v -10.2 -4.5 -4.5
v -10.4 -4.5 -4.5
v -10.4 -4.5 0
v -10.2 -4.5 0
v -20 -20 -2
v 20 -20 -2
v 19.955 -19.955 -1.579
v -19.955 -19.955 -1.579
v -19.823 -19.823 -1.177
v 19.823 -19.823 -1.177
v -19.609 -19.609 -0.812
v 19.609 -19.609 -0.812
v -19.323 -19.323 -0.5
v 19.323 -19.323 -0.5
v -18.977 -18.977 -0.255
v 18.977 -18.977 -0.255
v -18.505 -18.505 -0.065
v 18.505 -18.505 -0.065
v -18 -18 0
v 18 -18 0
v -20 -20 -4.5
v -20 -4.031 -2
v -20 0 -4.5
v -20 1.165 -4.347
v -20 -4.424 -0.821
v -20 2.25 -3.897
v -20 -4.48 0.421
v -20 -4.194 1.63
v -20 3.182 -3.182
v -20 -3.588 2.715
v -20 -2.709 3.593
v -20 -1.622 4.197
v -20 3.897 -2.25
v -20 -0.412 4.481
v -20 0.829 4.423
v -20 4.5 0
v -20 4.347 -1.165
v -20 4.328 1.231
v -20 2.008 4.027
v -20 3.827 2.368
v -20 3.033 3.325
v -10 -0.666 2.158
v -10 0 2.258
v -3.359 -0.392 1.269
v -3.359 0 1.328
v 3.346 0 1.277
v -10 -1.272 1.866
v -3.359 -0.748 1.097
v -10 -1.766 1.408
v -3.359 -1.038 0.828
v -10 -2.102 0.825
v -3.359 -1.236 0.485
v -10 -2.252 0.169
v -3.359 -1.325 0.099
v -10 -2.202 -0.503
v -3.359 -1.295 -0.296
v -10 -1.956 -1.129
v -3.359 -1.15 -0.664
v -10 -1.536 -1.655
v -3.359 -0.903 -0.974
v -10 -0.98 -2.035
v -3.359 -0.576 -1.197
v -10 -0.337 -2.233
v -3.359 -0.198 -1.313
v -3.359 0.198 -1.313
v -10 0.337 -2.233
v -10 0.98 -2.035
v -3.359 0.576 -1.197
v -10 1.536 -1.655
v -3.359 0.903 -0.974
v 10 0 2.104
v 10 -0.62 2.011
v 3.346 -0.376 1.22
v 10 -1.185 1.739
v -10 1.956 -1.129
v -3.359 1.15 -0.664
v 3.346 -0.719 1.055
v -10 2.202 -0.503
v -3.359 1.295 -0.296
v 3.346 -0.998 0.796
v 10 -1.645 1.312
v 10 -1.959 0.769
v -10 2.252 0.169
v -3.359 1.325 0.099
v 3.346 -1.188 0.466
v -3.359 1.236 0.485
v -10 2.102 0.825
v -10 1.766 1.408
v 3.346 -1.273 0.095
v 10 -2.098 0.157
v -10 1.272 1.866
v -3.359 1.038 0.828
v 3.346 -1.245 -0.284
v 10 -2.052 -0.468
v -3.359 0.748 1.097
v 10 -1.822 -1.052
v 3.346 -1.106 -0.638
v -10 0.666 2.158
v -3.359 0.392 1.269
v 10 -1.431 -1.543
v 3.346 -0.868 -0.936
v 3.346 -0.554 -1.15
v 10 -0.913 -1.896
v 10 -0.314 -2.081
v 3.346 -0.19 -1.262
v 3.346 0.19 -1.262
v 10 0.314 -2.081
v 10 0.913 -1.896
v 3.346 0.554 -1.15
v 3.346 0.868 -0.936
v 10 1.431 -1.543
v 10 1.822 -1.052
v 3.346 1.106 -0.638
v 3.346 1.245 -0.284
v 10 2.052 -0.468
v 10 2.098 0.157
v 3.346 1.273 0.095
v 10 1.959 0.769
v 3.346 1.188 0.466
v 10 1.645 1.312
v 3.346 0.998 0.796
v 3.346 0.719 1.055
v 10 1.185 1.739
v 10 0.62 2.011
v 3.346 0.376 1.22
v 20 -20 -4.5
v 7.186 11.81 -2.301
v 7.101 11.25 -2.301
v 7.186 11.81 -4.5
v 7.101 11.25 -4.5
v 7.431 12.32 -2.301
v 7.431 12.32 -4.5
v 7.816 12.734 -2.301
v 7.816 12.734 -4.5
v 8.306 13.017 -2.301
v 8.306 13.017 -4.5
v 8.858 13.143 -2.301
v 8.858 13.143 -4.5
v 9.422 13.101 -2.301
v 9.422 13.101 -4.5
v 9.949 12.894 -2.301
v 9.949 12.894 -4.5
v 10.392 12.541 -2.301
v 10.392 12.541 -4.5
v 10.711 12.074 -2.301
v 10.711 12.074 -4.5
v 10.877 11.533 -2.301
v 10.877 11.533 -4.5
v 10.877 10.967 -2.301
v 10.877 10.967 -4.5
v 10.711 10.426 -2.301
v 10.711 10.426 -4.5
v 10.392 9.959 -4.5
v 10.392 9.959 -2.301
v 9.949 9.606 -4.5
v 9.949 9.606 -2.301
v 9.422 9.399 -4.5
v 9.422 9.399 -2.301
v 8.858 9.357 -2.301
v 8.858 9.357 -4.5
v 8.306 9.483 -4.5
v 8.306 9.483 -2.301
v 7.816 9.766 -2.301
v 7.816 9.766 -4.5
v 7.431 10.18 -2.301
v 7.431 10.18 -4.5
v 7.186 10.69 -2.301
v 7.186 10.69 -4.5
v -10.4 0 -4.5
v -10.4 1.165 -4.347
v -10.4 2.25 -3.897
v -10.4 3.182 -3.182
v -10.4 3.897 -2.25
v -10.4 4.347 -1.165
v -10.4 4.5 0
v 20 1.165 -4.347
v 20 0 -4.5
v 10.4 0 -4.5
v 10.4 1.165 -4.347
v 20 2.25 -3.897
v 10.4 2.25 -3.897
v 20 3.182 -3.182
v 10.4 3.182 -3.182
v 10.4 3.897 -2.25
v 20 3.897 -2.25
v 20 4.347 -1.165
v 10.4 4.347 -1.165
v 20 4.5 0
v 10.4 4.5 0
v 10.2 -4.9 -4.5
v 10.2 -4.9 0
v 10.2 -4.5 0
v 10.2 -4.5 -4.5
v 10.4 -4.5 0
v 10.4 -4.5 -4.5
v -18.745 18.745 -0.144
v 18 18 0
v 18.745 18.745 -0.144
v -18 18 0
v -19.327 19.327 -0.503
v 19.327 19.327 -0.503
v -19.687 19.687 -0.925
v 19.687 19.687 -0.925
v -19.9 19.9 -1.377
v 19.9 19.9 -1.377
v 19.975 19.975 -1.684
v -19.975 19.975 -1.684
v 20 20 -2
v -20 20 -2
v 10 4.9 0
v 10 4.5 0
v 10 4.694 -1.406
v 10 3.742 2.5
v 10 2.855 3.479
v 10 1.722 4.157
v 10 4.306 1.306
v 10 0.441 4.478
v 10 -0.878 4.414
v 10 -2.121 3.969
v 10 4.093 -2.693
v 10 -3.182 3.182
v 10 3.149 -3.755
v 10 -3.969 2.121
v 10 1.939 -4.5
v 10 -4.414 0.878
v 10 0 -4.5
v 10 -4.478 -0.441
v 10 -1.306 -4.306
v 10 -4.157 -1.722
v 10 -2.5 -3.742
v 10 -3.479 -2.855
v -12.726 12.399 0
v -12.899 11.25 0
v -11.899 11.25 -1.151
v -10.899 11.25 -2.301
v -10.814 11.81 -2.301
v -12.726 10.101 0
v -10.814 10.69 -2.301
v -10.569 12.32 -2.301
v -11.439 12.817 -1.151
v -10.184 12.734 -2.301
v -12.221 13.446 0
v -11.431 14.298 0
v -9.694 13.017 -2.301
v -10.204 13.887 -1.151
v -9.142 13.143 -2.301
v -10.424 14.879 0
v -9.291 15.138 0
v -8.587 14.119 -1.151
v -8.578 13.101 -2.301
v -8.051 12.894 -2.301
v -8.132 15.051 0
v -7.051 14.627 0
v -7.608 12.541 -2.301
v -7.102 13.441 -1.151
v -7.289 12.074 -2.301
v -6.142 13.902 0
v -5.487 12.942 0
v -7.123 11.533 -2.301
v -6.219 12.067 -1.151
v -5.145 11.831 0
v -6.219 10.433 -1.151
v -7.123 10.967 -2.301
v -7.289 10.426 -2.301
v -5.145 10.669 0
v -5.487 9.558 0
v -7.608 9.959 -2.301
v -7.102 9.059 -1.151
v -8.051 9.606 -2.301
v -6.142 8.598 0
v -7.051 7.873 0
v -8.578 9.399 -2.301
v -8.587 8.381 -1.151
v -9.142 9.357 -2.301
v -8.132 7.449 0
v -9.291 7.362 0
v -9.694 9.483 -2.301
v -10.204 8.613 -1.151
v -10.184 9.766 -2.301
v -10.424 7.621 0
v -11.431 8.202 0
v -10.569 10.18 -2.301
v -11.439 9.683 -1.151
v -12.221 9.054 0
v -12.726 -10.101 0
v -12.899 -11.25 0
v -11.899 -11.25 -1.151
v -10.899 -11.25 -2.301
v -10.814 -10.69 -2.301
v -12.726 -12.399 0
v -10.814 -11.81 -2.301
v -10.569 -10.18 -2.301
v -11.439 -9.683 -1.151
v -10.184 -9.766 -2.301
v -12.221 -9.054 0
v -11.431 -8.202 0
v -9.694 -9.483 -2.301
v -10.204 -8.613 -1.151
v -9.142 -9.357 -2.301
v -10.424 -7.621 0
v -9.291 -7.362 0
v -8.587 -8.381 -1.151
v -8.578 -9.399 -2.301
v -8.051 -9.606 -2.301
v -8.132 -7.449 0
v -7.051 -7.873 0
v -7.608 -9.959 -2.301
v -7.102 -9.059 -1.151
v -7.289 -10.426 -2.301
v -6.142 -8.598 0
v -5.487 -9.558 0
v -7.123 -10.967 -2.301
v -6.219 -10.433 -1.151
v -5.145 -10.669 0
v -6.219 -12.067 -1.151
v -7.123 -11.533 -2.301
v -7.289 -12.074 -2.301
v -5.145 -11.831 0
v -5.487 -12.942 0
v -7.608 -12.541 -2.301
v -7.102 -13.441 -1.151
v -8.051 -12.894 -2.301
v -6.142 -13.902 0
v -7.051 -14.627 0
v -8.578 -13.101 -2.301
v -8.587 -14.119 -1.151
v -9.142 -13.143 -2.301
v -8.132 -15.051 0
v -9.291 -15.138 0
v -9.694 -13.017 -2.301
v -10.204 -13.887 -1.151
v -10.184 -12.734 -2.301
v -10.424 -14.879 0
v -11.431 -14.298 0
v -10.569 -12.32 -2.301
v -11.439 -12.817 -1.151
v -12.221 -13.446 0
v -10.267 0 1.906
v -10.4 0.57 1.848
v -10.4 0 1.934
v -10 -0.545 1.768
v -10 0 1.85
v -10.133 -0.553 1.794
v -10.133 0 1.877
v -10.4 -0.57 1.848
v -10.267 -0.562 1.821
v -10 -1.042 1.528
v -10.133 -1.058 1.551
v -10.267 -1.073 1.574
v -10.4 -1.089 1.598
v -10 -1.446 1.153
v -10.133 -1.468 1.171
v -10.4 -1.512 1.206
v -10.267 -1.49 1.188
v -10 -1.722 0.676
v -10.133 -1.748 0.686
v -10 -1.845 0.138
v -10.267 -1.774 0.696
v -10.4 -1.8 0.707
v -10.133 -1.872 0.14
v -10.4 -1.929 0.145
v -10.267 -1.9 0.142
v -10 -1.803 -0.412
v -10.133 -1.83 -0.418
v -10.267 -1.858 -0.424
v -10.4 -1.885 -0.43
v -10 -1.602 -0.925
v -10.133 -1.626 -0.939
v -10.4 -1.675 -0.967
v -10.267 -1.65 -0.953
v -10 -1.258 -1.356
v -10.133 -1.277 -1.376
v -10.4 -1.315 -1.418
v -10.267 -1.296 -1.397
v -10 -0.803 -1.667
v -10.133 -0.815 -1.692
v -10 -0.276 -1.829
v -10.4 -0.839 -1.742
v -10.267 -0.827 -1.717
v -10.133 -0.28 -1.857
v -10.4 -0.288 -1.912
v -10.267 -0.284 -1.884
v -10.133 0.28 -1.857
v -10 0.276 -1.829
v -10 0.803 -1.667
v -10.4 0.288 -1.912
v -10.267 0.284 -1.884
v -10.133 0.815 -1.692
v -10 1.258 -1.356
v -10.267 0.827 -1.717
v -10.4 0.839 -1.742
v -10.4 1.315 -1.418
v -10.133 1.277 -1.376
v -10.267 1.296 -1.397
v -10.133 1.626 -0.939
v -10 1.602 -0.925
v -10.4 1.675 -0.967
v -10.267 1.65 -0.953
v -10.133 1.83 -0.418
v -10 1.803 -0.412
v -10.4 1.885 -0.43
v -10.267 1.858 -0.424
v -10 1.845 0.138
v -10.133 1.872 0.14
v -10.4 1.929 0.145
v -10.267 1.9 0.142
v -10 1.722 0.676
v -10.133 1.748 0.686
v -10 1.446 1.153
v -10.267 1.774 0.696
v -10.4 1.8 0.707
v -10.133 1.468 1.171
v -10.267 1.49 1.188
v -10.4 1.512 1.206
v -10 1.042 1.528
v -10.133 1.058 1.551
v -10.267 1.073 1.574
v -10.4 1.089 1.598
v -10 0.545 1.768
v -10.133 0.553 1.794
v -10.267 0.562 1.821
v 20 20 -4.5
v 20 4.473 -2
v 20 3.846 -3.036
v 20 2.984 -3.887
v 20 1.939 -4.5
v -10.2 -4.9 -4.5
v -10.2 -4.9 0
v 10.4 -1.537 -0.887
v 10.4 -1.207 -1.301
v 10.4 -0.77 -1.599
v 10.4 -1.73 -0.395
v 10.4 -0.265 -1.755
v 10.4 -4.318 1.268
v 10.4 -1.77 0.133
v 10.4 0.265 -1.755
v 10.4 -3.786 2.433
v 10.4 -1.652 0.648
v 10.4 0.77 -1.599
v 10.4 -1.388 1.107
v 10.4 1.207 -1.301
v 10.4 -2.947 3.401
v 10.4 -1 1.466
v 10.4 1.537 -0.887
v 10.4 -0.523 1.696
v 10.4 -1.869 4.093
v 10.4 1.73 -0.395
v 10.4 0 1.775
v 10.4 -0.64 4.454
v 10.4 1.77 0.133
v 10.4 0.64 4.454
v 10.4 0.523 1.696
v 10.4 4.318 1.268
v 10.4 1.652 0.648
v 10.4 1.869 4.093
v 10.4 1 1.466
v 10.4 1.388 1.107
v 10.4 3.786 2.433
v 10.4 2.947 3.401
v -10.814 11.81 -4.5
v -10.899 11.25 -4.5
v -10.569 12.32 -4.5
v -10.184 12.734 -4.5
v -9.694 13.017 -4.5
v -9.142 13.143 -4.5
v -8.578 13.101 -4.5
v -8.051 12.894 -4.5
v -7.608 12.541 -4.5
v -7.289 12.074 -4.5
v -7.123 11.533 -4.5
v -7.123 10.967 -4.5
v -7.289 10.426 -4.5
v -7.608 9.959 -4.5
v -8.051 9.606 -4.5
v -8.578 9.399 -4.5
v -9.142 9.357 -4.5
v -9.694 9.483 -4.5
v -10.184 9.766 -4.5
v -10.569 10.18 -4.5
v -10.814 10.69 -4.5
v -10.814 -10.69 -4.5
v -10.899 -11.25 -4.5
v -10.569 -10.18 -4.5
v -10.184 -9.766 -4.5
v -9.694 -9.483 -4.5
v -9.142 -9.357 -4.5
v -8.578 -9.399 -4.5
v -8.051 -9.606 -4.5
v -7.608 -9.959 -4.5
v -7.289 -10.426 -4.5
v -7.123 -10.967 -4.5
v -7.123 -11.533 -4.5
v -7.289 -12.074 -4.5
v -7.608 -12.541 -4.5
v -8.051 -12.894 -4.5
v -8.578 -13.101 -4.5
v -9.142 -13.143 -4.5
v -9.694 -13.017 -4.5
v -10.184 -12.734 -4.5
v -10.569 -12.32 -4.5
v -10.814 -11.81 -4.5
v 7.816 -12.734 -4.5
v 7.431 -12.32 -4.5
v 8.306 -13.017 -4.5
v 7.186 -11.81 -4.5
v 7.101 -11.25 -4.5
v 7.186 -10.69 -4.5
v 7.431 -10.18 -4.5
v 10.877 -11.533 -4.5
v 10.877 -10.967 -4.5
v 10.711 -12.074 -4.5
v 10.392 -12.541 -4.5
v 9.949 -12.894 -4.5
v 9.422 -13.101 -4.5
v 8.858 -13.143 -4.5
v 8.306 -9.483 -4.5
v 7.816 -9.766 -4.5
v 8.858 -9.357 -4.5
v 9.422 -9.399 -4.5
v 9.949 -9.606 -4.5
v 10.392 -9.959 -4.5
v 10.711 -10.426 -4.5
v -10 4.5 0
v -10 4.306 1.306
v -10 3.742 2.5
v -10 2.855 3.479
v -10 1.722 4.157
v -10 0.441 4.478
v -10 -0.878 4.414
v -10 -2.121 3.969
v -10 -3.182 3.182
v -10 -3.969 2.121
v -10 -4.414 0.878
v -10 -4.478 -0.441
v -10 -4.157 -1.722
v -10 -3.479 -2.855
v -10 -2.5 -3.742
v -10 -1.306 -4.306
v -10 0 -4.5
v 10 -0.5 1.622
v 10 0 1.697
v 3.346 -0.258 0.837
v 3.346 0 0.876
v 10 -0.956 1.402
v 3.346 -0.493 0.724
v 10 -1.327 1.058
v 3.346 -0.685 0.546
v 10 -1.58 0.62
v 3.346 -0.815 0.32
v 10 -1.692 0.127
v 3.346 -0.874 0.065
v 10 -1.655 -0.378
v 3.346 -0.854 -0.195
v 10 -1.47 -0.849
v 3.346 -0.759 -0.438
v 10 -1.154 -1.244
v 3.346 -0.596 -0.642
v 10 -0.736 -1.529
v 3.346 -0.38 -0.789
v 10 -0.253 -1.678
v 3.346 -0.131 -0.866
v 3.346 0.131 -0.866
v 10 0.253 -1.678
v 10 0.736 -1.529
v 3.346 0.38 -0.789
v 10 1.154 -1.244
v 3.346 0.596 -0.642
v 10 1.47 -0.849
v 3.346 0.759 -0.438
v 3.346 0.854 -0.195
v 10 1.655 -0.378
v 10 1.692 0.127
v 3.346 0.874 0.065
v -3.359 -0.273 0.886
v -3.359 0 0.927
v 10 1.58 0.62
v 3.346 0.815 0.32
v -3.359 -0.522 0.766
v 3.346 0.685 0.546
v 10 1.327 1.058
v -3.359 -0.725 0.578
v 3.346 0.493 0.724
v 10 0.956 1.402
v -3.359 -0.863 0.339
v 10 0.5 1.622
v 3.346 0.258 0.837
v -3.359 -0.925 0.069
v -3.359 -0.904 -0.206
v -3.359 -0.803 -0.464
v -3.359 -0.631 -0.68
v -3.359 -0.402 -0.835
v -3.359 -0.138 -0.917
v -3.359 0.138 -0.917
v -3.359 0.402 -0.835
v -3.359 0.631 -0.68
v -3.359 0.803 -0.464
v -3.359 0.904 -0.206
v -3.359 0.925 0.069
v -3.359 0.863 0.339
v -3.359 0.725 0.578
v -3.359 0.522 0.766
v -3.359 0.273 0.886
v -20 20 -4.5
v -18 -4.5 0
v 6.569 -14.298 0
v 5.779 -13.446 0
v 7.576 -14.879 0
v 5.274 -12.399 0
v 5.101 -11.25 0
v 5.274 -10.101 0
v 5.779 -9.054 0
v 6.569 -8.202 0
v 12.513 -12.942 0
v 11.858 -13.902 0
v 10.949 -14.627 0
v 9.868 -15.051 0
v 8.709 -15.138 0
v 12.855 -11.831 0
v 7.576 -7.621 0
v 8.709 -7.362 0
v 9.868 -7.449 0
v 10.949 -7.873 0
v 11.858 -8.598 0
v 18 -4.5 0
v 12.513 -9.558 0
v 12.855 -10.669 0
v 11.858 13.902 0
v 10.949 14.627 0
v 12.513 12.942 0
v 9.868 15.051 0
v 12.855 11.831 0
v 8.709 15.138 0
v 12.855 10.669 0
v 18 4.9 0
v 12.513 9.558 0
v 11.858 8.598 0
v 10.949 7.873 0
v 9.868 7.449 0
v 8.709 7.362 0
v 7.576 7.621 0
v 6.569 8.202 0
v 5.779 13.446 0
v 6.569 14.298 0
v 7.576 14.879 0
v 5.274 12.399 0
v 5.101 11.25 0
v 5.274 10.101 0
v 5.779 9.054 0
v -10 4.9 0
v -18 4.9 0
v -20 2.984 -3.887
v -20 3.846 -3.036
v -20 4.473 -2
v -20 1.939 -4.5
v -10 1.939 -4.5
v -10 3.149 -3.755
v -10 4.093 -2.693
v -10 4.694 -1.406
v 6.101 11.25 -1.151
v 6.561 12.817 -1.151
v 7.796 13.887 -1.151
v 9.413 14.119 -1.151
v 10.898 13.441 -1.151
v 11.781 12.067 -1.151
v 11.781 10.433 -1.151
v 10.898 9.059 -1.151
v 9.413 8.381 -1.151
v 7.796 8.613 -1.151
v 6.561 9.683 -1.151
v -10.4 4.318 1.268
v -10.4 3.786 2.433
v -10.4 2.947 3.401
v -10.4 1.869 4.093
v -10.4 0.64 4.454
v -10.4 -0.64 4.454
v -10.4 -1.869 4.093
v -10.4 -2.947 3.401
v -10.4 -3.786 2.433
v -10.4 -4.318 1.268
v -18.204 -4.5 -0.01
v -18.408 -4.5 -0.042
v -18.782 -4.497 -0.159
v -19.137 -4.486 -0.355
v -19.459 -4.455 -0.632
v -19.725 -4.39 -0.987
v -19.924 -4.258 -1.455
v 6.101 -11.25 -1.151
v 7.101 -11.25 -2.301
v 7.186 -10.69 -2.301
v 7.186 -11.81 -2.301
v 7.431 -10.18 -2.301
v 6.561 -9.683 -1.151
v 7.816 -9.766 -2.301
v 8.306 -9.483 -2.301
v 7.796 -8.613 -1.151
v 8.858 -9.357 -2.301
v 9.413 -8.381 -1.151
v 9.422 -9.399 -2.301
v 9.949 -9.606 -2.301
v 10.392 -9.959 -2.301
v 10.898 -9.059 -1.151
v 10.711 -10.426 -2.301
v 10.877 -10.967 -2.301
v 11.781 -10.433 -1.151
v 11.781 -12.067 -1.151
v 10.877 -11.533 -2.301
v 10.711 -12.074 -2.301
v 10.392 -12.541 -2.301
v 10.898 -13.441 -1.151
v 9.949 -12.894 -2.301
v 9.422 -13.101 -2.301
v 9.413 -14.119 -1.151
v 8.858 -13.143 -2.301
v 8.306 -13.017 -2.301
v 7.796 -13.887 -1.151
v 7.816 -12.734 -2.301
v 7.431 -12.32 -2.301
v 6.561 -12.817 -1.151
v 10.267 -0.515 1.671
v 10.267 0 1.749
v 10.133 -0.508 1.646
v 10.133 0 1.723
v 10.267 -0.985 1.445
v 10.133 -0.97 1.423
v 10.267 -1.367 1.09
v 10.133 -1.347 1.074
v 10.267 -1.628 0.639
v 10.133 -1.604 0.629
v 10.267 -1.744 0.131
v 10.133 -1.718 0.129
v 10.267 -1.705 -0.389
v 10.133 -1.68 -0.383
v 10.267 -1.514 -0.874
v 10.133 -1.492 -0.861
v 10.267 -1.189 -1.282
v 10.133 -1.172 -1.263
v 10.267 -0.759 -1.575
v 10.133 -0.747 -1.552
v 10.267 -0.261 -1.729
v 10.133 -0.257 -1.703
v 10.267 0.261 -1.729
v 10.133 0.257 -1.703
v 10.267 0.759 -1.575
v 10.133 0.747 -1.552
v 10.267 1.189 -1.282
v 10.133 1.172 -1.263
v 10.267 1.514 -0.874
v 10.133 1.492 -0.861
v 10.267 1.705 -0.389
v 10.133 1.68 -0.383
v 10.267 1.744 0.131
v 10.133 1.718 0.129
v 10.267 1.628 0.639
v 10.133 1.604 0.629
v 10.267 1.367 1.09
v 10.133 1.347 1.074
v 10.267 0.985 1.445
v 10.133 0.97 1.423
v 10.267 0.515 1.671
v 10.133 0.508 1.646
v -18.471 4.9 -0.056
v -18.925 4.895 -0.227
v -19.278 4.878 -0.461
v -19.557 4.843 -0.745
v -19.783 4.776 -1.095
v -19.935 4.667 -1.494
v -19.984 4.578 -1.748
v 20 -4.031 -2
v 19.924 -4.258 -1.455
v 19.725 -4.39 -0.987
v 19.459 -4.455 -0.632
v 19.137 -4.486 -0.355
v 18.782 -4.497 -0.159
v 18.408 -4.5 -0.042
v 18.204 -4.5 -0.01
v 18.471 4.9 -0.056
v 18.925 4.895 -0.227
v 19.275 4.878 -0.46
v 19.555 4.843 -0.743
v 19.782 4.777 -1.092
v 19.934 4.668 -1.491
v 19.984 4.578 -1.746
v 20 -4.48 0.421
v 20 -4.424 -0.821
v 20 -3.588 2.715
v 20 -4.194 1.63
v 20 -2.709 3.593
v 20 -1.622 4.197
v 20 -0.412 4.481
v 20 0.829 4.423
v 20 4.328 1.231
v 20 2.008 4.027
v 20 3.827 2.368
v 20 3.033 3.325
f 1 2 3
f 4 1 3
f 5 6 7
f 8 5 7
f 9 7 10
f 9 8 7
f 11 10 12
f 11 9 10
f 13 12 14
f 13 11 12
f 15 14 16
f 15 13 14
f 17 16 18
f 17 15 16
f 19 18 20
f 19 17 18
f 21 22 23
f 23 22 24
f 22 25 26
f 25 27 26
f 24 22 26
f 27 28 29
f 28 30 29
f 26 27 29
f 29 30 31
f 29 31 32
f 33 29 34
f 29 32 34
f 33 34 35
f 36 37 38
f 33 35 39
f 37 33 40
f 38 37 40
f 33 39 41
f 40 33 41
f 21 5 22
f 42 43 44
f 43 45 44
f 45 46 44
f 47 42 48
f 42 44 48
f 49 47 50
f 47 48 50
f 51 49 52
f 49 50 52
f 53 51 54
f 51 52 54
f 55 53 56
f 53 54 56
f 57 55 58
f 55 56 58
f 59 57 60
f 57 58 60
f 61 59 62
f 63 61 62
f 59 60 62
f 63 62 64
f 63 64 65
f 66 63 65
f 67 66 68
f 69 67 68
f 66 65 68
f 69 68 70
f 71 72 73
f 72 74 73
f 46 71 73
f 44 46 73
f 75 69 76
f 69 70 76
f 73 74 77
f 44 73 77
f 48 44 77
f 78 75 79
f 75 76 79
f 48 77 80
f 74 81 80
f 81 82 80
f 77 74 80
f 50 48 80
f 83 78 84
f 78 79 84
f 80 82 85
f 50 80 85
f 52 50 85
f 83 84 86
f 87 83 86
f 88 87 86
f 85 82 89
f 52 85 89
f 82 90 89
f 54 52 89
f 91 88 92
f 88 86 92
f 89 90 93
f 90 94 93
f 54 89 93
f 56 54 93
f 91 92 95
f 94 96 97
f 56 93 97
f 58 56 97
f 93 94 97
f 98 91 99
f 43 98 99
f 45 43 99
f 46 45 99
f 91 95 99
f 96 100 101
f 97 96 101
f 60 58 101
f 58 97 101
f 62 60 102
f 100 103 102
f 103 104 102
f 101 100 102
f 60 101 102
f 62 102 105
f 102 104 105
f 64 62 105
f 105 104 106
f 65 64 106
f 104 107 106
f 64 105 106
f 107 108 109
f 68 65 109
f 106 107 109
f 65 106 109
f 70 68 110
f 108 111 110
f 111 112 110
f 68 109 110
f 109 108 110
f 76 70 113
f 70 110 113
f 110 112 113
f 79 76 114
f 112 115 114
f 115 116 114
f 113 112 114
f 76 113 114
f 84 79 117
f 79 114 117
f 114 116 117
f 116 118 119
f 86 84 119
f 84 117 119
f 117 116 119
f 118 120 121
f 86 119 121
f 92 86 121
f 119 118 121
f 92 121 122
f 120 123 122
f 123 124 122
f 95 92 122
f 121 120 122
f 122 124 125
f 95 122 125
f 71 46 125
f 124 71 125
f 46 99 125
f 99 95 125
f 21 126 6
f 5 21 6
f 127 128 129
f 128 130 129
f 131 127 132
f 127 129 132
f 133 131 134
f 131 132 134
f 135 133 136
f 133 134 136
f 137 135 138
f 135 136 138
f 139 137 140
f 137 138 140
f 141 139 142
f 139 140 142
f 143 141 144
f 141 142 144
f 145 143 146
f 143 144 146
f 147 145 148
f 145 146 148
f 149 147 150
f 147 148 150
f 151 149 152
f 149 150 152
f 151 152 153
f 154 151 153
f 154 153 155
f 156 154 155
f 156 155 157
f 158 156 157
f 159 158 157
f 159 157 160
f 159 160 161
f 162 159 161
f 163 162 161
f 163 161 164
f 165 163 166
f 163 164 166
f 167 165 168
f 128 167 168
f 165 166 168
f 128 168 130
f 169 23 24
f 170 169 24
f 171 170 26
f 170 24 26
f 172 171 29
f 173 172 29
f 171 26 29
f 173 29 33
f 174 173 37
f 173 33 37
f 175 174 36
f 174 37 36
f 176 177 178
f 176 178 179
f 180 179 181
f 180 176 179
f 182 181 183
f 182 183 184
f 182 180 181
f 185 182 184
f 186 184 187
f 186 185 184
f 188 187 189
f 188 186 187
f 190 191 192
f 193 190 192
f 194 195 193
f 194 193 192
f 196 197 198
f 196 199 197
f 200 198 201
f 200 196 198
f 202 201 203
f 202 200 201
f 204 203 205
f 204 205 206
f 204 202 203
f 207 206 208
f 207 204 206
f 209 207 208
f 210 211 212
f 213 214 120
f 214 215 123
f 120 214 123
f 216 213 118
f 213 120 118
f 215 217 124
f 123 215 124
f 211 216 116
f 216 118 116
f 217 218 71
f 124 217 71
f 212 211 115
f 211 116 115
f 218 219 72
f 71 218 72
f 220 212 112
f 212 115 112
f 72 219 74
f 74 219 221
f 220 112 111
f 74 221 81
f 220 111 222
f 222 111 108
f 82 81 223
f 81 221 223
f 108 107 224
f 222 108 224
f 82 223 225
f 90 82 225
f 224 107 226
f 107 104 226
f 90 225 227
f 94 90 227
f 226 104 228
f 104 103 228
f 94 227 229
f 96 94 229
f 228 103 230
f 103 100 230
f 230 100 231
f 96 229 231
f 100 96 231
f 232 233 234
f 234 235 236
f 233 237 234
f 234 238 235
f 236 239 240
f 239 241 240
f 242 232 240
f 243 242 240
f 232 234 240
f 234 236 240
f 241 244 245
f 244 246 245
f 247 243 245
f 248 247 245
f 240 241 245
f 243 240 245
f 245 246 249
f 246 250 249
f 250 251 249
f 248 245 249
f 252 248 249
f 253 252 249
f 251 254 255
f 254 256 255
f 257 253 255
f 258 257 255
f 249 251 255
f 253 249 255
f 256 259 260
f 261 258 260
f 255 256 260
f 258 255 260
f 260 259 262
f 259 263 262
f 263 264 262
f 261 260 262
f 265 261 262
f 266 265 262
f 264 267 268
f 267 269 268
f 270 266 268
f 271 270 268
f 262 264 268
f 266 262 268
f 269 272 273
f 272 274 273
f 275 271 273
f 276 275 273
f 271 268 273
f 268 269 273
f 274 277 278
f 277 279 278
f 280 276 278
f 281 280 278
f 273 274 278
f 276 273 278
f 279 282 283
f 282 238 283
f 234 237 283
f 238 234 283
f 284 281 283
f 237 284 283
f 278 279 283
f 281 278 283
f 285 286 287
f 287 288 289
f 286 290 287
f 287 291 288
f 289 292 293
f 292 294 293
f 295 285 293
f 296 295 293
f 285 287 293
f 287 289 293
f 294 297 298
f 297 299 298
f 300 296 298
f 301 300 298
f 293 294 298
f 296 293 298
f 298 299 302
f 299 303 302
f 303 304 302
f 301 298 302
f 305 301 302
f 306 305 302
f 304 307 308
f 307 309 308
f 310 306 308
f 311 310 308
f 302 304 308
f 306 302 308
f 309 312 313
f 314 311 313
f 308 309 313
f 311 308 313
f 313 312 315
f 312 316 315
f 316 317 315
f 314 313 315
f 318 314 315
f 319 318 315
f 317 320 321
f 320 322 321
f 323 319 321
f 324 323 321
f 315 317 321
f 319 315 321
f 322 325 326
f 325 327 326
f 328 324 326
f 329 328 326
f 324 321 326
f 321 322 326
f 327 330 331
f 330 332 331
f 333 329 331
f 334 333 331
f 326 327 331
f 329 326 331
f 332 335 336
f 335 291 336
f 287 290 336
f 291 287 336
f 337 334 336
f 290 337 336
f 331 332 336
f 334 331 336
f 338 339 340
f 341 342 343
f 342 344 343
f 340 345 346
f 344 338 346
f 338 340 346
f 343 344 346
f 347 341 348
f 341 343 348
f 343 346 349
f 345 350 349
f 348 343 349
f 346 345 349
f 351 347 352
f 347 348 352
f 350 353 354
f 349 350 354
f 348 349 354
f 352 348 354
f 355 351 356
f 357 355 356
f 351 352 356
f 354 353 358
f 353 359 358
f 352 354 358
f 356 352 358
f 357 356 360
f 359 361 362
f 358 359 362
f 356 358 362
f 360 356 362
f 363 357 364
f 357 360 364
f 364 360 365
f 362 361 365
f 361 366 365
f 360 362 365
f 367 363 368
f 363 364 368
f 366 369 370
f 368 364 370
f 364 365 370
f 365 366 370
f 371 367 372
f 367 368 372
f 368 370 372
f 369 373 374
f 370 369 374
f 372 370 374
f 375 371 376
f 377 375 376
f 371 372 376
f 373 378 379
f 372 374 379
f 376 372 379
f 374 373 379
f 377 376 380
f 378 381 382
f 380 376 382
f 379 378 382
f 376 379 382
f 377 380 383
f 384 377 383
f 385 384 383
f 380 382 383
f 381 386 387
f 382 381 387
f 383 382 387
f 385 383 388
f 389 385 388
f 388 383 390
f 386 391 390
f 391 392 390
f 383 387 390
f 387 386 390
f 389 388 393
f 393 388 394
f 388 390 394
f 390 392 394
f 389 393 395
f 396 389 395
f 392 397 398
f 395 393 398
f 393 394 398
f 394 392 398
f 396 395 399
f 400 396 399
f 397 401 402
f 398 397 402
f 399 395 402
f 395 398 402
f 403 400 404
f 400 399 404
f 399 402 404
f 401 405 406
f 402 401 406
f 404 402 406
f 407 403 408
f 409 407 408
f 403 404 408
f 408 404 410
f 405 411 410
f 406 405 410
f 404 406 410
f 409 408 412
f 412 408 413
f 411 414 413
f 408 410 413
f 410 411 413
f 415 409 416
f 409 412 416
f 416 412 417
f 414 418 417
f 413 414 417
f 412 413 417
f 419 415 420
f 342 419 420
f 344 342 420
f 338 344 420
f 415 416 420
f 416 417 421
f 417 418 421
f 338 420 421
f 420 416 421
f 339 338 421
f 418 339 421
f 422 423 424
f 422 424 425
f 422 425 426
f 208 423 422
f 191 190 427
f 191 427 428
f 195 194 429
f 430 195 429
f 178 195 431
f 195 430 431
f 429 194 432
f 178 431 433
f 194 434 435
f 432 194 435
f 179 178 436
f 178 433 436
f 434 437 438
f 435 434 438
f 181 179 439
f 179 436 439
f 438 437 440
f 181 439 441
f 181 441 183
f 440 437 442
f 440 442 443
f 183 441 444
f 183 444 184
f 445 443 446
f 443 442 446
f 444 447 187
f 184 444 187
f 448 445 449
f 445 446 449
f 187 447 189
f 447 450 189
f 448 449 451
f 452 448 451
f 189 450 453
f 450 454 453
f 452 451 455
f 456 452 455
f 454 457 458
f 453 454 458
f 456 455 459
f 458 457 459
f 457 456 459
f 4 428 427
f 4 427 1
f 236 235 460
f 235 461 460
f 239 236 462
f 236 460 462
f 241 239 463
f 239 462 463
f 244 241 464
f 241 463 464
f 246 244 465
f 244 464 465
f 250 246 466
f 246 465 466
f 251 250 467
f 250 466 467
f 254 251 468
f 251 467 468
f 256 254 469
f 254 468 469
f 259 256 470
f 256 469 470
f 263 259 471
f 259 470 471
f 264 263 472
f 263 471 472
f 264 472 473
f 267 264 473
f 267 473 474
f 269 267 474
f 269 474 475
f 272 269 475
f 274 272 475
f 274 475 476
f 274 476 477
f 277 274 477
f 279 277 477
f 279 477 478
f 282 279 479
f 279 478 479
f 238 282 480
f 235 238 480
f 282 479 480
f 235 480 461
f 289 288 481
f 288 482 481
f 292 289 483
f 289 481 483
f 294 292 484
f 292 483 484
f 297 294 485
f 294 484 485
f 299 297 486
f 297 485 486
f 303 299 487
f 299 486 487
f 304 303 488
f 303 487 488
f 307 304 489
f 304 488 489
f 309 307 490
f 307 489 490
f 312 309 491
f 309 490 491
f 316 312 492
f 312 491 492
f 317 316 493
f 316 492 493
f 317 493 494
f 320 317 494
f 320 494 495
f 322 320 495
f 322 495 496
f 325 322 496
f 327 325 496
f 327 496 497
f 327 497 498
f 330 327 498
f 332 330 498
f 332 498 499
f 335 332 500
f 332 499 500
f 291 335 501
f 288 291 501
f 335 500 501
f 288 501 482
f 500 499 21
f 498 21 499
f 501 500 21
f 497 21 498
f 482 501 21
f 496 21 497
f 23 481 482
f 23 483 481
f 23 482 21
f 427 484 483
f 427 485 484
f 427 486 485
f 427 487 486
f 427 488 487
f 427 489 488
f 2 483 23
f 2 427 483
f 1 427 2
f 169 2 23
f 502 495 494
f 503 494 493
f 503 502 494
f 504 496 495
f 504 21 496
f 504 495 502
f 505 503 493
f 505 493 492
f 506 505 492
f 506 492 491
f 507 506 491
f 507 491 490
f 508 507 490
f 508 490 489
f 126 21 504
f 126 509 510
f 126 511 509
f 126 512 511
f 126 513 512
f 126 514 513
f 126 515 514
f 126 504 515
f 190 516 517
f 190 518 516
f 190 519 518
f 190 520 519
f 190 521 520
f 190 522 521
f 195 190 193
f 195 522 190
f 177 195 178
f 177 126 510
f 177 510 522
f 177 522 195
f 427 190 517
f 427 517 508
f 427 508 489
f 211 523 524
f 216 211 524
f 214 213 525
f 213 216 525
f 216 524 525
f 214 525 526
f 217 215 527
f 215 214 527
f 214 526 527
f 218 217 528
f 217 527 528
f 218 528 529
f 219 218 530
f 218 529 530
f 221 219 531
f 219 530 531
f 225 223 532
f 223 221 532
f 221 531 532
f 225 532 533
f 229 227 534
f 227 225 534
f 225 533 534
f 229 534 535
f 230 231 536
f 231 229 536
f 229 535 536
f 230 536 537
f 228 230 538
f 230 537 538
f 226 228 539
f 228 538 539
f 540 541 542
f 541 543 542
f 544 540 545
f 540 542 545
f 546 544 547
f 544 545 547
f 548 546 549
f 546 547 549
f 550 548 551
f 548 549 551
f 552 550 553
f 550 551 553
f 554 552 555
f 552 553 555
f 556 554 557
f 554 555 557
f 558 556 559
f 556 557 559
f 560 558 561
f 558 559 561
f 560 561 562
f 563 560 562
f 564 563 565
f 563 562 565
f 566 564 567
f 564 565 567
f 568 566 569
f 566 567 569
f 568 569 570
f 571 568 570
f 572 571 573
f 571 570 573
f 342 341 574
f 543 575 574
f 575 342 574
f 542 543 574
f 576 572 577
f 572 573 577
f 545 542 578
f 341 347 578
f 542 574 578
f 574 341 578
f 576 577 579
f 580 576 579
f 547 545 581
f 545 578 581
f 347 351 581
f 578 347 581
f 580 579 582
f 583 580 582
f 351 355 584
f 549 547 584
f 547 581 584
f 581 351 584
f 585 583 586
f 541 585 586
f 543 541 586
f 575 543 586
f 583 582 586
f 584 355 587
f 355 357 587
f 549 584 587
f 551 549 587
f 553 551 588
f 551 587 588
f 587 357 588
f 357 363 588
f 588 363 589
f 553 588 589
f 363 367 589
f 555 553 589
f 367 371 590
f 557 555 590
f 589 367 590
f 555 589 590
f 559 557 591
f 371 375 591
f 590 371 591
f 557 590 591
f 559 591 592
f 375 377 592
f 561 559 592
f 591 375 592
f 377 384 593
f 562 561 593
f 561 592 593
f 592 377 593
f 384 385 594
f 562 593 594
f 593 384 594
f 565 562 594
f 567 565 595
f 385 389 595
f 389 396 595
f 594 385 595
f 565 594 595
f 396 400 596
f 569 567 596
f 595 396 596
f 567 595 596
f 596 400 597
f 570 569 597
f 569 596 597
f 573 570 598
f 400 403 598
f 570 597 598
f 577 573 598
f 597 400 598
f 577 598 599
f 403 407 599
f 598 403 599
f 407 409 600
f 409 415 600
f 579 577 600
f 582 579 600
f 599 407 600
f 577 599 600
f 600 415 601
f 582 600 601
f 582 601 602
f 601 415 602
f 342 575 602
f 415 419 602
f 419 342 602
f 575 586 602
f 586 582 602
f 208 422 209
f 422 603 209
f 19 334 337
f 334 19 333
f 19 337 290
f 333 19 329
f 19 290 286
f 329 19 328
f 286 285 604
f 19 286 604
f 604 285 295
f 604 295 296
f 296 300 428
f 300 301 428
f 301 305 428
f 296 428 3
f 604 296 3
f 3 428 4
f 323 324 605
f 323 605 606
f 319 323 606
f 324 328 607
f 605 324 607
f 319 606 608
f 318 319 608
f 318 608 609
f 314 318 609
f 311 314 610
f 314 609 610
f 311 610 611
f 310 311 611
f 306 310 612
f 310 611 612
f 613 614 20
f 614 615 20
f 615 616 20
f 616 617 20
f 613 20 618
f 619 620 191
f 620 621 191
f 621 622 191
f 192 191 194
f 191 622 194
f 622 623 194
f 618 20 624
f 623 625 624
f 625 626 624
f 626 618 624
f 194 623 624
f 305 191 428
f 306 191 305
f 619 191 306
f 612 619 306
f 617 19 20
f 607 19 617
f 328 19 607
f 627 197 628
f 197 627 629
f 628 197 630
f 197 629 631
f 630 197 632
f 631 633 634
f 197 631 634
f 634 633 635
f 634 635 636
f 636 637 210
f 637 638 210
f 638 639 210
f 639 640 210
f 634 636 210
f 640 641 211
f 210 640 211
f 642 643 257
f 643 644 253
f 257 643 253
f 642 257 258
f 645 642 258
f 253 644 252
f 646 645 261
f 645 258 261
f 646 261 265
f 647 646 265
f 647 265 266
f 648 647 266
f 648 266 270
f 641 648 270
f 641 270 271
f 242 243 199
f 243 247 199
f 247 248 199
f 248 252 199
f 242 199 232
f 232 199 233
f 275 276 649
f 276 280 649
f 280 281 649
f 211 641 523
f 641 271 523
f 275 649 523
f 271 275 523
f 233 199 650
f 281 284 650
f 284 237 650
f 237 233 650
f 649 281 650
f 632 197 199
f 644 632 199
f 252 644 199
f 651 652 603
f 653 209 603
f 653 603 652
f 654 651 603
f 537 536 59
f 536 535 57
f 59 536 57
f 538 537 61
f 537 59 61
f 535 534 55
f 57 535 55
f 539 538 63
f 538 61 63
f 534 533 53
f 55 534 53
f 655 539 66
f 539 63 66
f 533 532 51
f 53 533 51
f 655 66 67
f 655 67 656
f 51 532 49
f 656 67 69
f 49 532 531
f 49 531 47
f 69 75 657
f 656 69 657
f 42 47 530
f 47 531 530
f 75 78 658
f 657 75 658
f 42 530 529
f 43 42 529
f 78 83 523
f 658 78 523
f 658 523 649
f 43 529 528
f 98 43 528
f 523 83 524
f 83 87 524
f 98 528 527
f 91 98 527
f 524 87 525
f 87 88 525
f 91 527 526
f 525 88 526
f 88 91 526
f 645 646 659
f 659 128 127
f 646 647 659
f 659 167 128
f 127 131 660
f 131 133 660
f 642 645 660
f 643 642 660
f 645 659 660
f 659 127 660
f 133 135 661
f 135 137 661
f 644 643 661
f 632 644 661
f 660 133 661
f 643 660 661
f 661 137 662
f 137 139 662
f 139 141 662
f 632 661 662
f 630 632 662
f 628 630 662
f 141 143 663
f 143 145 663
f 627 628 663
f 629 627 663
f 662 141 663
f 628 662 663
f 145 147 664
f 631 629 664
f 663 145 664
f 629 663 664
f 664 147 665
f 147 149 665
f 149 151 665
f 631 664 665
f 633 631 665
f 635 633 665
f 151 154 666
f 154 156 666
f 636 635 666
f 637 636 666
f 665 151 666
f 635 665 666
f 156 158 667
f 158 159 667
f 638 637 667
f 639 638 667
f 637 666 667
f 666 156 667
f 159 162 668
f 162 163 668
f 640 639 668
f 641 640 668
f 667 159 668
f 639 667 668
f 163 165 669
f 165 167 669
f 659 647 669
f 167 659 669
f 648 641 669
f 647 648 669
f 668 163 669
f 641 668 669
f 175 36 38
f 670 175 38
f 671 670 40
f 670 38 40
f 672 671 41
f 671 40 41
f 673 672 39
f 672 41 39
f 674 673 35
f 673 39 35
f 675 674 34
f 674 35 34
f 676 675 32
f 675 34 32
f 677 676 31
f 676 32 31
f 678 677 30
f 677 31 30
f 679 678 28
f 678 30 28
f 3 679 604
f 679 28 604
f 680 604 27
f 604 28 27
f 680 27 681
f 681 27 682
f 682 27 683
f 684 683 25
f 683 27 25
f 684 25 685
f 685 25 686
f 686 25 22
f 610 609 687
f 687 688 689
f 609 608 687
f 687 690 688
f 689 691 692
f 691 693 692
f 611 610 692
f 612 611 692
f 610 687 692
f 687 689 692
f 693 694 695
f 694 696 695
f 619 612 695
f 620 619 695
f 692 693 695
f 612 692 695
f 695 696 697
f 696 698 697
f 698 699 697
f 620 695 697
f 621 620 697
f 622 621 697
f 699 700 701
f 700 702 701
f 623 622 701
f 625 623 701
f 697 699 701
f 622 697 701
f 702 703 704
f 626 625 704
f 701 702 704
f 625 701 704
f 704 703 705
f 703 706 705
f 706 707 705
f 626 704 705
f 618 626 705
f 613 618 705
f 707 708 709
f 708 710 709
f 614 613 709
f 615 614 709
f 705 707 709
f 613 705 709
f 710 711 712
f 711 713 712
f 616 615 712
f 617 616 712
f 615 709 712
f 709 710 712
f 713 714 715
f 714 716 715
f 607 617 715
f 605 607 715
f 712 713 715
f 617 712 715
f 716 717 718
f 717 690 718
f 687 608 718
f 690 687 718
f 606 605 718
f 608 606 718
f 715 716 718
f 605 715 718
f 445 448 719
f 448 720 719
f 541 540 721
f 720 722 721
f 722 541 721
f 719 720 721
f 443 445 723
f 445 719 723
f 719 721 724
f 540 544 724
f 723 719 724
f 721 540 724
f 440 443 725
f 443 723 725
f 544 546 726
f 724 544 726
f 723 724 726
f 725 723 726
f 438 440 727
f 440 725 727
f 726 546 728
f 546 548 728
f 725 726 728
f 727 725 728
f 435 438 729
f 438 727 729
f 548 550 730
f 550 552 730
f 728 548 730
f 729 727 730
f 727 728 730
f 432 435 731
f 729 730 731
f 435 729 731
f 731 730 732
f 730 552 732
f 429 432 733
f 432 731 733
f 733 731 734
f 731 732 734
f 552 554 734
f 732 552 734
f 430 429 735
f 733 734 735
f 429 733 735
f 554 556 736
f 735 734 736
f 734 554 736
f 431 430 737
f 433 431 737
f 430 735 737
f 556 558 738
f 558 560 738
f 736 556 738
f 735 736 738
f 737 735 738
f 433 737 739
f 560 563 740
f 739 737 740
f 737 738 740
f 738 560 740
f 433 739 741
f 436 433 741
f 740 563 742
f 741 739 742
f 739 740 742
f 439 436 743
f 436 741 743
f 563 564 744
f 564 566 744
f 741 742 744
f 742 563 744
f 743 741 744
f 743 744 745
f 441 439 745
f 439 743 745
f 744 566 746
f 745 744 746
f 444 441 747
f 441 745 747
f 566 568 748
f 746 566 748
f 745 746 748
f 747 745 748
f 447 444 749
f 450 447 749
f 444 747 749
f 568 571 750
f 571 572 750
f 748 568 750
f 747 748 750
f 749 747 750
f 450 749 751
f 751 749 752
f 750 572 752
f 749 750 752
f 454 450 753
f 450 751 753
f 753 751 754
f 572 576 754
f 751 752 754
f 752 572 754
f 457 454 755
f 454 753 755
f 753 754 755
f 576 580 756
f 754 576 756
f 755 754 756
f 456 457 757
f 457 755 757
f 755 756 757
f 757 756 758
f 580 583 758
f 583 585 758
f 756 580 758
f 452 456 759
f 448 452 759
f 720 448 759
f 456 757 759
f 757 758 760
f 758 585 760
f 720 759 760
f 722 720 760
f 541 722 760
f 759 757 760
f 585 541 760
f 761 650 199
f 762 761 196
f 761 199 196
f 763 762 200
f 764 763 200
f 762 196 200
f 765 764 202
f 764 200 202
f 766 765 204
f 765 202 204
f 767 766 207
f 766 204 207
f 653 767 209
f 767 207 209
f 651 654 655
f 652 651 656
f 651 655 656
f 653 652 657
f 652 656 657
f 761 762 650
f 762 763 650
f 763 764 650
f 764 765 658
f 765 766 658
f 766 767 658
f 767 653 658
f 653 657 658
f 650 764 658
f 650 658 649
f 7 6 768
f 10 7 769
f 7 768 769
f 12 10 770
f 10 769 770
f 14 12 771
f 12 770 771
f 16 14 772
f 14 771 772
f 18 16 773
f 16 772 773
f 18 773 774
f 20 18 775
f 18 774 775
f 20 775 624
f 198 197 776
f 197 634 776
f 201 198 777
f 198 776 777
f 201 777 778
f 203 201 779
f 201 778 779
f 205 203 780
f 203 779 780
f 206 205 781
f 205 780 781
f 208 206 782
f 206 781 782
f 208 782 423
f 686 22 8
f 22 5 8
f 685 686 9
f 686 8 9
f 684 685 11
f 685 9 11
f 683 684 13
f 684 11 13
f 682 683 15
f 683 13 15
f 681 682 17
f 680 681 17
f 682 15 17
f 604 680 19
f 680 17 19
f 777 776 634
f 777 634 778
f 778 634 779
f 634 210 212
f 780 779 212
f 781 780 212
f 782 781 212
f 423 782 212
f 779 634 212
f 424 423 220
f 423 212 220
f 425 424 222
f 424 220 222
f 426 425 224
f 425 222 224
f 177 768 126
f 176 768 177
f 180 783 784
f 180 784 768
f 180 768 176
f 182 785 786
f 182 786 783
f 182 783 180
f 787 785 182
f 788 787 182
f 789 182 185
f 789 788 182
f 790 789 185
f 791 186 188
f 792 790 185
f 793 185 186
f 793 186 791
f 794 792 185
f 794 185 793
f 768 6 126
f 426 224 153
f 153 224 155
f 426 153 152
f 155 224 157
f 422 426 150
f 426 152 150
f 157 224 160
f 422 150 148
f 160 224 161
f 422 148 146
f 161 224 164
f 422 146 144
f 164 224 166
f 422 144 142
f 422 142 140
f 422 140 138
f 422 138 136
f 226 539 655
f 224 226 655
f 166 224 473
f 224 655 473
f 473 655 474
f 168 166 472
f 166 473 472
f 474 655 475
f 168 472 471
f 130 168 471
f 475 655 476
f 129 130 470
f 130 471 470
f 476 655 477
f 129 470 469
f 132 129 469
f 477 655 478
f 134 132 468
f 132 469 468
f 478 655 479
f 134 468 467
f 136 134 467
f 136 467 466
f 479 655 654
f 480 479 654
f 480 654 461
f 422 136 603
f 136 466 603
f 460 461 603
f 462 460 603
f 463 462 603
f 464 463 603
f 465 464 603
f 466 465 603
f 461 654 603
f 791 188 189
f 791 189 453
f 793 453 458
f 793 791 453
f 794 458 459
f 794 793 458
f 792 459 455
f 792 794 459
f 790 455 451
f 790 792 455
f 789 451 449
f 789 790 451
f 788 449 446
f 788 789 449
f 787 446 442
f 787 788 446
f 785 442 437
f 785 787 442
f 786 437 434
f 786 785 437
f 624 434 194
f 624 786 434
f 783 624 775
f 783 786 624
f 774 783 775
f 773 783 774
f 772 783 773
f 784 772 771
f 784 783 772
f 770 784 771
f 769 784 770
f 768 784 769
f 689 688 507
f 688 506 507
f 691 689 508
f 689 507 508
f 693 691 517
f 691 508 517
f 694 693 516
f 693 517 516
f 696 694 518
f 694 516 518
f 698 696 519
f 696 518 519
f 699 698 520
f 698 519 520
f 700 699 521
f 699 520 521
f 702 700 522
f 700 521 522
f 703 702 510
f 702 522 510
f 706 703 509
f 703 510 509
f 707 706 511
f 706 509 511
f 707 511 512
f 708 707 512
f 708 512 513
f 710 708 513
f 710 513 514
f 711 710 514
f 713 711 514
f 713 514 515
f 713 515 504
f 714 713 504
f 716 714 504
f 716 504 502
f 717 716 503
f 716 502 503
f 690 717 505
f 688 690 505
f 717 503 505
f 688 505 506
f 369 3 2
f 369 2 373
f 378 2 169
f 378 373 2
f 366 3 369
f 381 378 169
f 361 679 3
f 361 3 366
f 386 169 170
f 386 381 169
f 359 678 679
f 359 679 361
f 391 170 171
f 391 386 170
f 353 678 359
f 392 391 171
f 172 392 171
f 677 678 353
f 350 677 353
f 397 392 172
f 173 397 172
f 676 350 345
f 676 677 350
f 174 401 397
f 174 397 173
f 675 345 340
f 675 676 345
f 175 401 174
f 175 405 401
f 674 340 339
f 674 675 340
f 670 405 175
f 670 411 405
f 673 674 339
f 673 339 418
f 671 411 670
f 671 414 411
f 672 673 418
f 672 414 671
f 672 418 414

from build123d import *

# Parameters (mm, degrees)
F4_W              = 15.5
F4_H              = 4.5
F7_DEPTH          = 10
F7_DEPTH_BACK     = 10
F8_W              = 0.4
F8_H              = 4.5
F9_DEPTH          = 9.6
F11_DEPTH         = 9.6
F12_DEPTH         = 9.8
F10_W             = 0.4
F10_H             = 4.5
F13_DEPTH         = 9.8
F8_W_2            = 15.1
F14_DEPTH         = 40
F16_DEPTH         = 10
F18_DEPTH         = 10
F19_R             = 2
F19_2_R           = 2
F21_D             = 3.7973
F21_CSINK_D       = 7.7978
F21_CSINK_ANGLE   = 82
F21_2_D           = 3.7973
F21_2_CSINK_D     = 7.7978
F21_2_CSINK_ANGLE = 82


with BuildPart() as f2:
    # F1 (on Front) → F2 (revolve)
    with BuildSketch(Plane.XZ):
        with BuildLine():
            Line((-10, 1.8498126353), (-10, 0))
            Line((-10, 0), (10, 0))
            Line((10, 0), (10, 1.6971506079))
            ThreePointArc((10, 1.6971506079), (-0.0074897347, 0.7922638586), (-10, 1.8498126353))
        make_face()
        with BuildLine():
            Line((-10.4, 0), (-10, 0))
            Line((-10, 0), (-10, 1.8498126353))
            ThreePointArc((-10, 1.8498126353), (-10.2000835145, 1.8914635263), (-10.4, 1.9339088831))
            Line((-10.4, 1.9339088831), (-10.4, 0))
        make_face()
        with BuildLine():
            Line((10, 1.6971506079), (10, 0))
            Line((10, 0), (10.4, 0))
            Line((10.4, 0), (10.4, 1.774885404))
            ThreePointArc((10.4, 1.774885404), (10.2000769588, 1.7356219988), (10, 1.6971506079))
        make_face()
    revolve(axis=Axis((0, 0, 0), (1, 0, 0)))

    # F8 (on offset) → F9 (join, through all)
    with BuildSketch(Plane.YZ.offset(20)):
        with Locations((-4.7, -2.25)):
            Rectangle(F8_W, F8_H)
        with BuildLine():
            ThreePointArc((4.5, 0), (0, 4.5), (-4.5, 0))
            Line((-4.5, 0), (4.5, 0))
        make_face()
        with BuildLine():
            ThreePointArc((0, -4.5), (-3.1819805153, -3.1819805153), (-4.5, 0))
            Line((-4.5, 0), (-4.5, -4.5))
            Line((-4.5, -4.5), (0, -4.5))
        make_face()
        with BuildLine():
            Line((4.5, 0), (-4.5, 0))
            ThreePointArc((-4.5, 0), (-3.1819805153, -3.1819805153), (0, -4.5))
            ThreePointArc((0, -4.5), (3.1819805153, -3.1819805153), (4.5, 0))
        make_face()
    extrude(amount=-F9_DEPTH)

    # F10 (on offset) → F11 (join, through all)
    with BuildSketch(Plane.YZ.offset(-20)):
        with BuildLine():
            ThreePointArc((0, -4.5), (3.1819805153, -3.1819805153), (4.5, 0))
            Line((4.5, 0), (-4.5, 0))
            ThreePointArc((-4.5, 0), (-3.1819805153, -3.1819805153), (0, -4.5))
        make_face()
        with BuildLine():
            Line((-4.5, 0), (4.5, 0))
            ThreePointArc((4.5, 0), (0, 4.5), (-4.5, 0))
        make_face()
        with BuildLine():
            ThreePointArc((0, -4.5), (-3.1819805153, -3.1819805153), (-4.5, 0))
            Line((-4.5, 0), (-4.5, -4.5))
            Line((-4.5, -4.5), (0, -4.5))
        make_face()
    extrude(amount=F11_DEPTH)

    # F8 (on offset) → F12 (join)
    with BuildSketch(Plane.YZ.offset(20)):
        with Locations((-4.7, -2.25)):
            Rectangle(F8_W, F8_H)
    extrude(amount=-F12_DEPTH)

    # F10 (on offset) → F13 (join)
    with BuildSketch(Plane.YZ.offset(-20)):
        with Locations((-4.7, -2.25)):
            Rectangle(F10_W, F10_H)
    extrude(amount=F13_DEPTH)

    # F8 (on offset) → F14 (join, through all)
    with BuildSketch(Plane.YZ.offset(20)):
        with Locations((-12.45, -2.25)):
            Rectangle(F8_W_2, F8_H)
    extrude(amount=-F14_DEPTH)

    # F19
    f19_edges = [f2.edges().sort_by_distance(p)[0] for p in [
        (20, -12.25, 0),
        (0, -20, 0),
        (-20, -12.25, 0),
    ]]
    fillet(f19_edges, radius=F19_R)

    # F21 (through all)
    with Locations(Plane.XY):
        with Locations((9, 11.25), (-9, 11.25), (-9, -11.25), (9, -11.25)):
            CounterSinkHole(F21_D / 2, F21_CSINK_D / 2, counter_sink_angle=F21_CSINK_ANGLE)


with BuildPart() as f3:
    # F1 (on Front) → F3 (revolve)
    with BuildSketch(Plane.XZ):
        with BuildLine():
            Line((-10, 4.5), (-10, 2.2582874036))
            ThreePointArc((-10, 2.2582874036), (-0.0076110898, 1.1922765363), (10, 2.1043815617))
            Line((10, 2.1043815617), (10, 4.5))
            Line((10, 4.5), (-10, 4.5))
        make_face()
    revolve(axis=Axis((0, 0, 0), (1, 0, 0)))

    # F4 (on Right) → F7 (join, two sides)
    with BuildSketch(Plane.YZ) as f7_sk:
        with Locations((12.25, -2.25)):
            Rectangle(F4_W, F4_H)
        with BuildLine():
            Line((4.5, -4.5), (4.5, 0))
            ThreePointArc((4.5, 0), (3.1819805153, -3.1819805153), (0, -4.5))
            Line((0, -4.5), (4.5, -4.5))
        make_face()
    extrude(amount=F7_DEPTH)
    extrude(f7_sk.sketch, amount=-F7_DEPTH_BACK)

    # F15 (on face) → F16 (join, through all)
    with BuildSketch(Plane(origin=(-10, 0, 0), x_dir=(0, -1, 0), z_dir=(-1, 0, 0))):
        with BuildLine():
            ThreePointArc((-1.939071943, -4.5), (-4.0933759002, -2.6933759002), (-4.9, 0))
            Line((-4.9, 0), (-20, 0))
            Line((-20, 0), (-20, -4.5))
            Line((-20, -4.5), (-1.939071943, -4.5))
        make_face()
    extrude(amount=F16_DEPTH)

    # F17 (on face) → F18 (join, through all)
    with BuildSketch(Plane.YZ.offset(10)):
        with BuildLine():
            Line((20, 0), (4.9, 0))
            ThreePointArc((4.9, 0), (4.0933759002, -2.6933759002), (1.939071943, -4.5))
            Line((1.939071943, -4.5), (20, -4.5))
            Line((20, -4.5), (20, 0))
        make_face()
    extrude(amount=F18_DEPTH)

    # F19#2
    f19_2_edges = [f3.edges().sort_by_distance(p)[0] for p in [
        (20, 12.45, 0),
        (0, 20, 0),
        (-20, 12.45, 0),
    ]]
    fillet(f19_2_edges, radius=F19_2_R)

    # F21#2 (through all)
    with Locations(Plane.XY):
        with Locations((9, 11.25), (-9, 11.25), (-9, -11.25), (9, -11.25)):
            CounterSinkHole(F21_2_D / 2, F21_2_CSINK_D / 2, counter_sink_angle=F21_2_CSINK_ANGLE)


solid = Compound([f2.part, f3.part])
